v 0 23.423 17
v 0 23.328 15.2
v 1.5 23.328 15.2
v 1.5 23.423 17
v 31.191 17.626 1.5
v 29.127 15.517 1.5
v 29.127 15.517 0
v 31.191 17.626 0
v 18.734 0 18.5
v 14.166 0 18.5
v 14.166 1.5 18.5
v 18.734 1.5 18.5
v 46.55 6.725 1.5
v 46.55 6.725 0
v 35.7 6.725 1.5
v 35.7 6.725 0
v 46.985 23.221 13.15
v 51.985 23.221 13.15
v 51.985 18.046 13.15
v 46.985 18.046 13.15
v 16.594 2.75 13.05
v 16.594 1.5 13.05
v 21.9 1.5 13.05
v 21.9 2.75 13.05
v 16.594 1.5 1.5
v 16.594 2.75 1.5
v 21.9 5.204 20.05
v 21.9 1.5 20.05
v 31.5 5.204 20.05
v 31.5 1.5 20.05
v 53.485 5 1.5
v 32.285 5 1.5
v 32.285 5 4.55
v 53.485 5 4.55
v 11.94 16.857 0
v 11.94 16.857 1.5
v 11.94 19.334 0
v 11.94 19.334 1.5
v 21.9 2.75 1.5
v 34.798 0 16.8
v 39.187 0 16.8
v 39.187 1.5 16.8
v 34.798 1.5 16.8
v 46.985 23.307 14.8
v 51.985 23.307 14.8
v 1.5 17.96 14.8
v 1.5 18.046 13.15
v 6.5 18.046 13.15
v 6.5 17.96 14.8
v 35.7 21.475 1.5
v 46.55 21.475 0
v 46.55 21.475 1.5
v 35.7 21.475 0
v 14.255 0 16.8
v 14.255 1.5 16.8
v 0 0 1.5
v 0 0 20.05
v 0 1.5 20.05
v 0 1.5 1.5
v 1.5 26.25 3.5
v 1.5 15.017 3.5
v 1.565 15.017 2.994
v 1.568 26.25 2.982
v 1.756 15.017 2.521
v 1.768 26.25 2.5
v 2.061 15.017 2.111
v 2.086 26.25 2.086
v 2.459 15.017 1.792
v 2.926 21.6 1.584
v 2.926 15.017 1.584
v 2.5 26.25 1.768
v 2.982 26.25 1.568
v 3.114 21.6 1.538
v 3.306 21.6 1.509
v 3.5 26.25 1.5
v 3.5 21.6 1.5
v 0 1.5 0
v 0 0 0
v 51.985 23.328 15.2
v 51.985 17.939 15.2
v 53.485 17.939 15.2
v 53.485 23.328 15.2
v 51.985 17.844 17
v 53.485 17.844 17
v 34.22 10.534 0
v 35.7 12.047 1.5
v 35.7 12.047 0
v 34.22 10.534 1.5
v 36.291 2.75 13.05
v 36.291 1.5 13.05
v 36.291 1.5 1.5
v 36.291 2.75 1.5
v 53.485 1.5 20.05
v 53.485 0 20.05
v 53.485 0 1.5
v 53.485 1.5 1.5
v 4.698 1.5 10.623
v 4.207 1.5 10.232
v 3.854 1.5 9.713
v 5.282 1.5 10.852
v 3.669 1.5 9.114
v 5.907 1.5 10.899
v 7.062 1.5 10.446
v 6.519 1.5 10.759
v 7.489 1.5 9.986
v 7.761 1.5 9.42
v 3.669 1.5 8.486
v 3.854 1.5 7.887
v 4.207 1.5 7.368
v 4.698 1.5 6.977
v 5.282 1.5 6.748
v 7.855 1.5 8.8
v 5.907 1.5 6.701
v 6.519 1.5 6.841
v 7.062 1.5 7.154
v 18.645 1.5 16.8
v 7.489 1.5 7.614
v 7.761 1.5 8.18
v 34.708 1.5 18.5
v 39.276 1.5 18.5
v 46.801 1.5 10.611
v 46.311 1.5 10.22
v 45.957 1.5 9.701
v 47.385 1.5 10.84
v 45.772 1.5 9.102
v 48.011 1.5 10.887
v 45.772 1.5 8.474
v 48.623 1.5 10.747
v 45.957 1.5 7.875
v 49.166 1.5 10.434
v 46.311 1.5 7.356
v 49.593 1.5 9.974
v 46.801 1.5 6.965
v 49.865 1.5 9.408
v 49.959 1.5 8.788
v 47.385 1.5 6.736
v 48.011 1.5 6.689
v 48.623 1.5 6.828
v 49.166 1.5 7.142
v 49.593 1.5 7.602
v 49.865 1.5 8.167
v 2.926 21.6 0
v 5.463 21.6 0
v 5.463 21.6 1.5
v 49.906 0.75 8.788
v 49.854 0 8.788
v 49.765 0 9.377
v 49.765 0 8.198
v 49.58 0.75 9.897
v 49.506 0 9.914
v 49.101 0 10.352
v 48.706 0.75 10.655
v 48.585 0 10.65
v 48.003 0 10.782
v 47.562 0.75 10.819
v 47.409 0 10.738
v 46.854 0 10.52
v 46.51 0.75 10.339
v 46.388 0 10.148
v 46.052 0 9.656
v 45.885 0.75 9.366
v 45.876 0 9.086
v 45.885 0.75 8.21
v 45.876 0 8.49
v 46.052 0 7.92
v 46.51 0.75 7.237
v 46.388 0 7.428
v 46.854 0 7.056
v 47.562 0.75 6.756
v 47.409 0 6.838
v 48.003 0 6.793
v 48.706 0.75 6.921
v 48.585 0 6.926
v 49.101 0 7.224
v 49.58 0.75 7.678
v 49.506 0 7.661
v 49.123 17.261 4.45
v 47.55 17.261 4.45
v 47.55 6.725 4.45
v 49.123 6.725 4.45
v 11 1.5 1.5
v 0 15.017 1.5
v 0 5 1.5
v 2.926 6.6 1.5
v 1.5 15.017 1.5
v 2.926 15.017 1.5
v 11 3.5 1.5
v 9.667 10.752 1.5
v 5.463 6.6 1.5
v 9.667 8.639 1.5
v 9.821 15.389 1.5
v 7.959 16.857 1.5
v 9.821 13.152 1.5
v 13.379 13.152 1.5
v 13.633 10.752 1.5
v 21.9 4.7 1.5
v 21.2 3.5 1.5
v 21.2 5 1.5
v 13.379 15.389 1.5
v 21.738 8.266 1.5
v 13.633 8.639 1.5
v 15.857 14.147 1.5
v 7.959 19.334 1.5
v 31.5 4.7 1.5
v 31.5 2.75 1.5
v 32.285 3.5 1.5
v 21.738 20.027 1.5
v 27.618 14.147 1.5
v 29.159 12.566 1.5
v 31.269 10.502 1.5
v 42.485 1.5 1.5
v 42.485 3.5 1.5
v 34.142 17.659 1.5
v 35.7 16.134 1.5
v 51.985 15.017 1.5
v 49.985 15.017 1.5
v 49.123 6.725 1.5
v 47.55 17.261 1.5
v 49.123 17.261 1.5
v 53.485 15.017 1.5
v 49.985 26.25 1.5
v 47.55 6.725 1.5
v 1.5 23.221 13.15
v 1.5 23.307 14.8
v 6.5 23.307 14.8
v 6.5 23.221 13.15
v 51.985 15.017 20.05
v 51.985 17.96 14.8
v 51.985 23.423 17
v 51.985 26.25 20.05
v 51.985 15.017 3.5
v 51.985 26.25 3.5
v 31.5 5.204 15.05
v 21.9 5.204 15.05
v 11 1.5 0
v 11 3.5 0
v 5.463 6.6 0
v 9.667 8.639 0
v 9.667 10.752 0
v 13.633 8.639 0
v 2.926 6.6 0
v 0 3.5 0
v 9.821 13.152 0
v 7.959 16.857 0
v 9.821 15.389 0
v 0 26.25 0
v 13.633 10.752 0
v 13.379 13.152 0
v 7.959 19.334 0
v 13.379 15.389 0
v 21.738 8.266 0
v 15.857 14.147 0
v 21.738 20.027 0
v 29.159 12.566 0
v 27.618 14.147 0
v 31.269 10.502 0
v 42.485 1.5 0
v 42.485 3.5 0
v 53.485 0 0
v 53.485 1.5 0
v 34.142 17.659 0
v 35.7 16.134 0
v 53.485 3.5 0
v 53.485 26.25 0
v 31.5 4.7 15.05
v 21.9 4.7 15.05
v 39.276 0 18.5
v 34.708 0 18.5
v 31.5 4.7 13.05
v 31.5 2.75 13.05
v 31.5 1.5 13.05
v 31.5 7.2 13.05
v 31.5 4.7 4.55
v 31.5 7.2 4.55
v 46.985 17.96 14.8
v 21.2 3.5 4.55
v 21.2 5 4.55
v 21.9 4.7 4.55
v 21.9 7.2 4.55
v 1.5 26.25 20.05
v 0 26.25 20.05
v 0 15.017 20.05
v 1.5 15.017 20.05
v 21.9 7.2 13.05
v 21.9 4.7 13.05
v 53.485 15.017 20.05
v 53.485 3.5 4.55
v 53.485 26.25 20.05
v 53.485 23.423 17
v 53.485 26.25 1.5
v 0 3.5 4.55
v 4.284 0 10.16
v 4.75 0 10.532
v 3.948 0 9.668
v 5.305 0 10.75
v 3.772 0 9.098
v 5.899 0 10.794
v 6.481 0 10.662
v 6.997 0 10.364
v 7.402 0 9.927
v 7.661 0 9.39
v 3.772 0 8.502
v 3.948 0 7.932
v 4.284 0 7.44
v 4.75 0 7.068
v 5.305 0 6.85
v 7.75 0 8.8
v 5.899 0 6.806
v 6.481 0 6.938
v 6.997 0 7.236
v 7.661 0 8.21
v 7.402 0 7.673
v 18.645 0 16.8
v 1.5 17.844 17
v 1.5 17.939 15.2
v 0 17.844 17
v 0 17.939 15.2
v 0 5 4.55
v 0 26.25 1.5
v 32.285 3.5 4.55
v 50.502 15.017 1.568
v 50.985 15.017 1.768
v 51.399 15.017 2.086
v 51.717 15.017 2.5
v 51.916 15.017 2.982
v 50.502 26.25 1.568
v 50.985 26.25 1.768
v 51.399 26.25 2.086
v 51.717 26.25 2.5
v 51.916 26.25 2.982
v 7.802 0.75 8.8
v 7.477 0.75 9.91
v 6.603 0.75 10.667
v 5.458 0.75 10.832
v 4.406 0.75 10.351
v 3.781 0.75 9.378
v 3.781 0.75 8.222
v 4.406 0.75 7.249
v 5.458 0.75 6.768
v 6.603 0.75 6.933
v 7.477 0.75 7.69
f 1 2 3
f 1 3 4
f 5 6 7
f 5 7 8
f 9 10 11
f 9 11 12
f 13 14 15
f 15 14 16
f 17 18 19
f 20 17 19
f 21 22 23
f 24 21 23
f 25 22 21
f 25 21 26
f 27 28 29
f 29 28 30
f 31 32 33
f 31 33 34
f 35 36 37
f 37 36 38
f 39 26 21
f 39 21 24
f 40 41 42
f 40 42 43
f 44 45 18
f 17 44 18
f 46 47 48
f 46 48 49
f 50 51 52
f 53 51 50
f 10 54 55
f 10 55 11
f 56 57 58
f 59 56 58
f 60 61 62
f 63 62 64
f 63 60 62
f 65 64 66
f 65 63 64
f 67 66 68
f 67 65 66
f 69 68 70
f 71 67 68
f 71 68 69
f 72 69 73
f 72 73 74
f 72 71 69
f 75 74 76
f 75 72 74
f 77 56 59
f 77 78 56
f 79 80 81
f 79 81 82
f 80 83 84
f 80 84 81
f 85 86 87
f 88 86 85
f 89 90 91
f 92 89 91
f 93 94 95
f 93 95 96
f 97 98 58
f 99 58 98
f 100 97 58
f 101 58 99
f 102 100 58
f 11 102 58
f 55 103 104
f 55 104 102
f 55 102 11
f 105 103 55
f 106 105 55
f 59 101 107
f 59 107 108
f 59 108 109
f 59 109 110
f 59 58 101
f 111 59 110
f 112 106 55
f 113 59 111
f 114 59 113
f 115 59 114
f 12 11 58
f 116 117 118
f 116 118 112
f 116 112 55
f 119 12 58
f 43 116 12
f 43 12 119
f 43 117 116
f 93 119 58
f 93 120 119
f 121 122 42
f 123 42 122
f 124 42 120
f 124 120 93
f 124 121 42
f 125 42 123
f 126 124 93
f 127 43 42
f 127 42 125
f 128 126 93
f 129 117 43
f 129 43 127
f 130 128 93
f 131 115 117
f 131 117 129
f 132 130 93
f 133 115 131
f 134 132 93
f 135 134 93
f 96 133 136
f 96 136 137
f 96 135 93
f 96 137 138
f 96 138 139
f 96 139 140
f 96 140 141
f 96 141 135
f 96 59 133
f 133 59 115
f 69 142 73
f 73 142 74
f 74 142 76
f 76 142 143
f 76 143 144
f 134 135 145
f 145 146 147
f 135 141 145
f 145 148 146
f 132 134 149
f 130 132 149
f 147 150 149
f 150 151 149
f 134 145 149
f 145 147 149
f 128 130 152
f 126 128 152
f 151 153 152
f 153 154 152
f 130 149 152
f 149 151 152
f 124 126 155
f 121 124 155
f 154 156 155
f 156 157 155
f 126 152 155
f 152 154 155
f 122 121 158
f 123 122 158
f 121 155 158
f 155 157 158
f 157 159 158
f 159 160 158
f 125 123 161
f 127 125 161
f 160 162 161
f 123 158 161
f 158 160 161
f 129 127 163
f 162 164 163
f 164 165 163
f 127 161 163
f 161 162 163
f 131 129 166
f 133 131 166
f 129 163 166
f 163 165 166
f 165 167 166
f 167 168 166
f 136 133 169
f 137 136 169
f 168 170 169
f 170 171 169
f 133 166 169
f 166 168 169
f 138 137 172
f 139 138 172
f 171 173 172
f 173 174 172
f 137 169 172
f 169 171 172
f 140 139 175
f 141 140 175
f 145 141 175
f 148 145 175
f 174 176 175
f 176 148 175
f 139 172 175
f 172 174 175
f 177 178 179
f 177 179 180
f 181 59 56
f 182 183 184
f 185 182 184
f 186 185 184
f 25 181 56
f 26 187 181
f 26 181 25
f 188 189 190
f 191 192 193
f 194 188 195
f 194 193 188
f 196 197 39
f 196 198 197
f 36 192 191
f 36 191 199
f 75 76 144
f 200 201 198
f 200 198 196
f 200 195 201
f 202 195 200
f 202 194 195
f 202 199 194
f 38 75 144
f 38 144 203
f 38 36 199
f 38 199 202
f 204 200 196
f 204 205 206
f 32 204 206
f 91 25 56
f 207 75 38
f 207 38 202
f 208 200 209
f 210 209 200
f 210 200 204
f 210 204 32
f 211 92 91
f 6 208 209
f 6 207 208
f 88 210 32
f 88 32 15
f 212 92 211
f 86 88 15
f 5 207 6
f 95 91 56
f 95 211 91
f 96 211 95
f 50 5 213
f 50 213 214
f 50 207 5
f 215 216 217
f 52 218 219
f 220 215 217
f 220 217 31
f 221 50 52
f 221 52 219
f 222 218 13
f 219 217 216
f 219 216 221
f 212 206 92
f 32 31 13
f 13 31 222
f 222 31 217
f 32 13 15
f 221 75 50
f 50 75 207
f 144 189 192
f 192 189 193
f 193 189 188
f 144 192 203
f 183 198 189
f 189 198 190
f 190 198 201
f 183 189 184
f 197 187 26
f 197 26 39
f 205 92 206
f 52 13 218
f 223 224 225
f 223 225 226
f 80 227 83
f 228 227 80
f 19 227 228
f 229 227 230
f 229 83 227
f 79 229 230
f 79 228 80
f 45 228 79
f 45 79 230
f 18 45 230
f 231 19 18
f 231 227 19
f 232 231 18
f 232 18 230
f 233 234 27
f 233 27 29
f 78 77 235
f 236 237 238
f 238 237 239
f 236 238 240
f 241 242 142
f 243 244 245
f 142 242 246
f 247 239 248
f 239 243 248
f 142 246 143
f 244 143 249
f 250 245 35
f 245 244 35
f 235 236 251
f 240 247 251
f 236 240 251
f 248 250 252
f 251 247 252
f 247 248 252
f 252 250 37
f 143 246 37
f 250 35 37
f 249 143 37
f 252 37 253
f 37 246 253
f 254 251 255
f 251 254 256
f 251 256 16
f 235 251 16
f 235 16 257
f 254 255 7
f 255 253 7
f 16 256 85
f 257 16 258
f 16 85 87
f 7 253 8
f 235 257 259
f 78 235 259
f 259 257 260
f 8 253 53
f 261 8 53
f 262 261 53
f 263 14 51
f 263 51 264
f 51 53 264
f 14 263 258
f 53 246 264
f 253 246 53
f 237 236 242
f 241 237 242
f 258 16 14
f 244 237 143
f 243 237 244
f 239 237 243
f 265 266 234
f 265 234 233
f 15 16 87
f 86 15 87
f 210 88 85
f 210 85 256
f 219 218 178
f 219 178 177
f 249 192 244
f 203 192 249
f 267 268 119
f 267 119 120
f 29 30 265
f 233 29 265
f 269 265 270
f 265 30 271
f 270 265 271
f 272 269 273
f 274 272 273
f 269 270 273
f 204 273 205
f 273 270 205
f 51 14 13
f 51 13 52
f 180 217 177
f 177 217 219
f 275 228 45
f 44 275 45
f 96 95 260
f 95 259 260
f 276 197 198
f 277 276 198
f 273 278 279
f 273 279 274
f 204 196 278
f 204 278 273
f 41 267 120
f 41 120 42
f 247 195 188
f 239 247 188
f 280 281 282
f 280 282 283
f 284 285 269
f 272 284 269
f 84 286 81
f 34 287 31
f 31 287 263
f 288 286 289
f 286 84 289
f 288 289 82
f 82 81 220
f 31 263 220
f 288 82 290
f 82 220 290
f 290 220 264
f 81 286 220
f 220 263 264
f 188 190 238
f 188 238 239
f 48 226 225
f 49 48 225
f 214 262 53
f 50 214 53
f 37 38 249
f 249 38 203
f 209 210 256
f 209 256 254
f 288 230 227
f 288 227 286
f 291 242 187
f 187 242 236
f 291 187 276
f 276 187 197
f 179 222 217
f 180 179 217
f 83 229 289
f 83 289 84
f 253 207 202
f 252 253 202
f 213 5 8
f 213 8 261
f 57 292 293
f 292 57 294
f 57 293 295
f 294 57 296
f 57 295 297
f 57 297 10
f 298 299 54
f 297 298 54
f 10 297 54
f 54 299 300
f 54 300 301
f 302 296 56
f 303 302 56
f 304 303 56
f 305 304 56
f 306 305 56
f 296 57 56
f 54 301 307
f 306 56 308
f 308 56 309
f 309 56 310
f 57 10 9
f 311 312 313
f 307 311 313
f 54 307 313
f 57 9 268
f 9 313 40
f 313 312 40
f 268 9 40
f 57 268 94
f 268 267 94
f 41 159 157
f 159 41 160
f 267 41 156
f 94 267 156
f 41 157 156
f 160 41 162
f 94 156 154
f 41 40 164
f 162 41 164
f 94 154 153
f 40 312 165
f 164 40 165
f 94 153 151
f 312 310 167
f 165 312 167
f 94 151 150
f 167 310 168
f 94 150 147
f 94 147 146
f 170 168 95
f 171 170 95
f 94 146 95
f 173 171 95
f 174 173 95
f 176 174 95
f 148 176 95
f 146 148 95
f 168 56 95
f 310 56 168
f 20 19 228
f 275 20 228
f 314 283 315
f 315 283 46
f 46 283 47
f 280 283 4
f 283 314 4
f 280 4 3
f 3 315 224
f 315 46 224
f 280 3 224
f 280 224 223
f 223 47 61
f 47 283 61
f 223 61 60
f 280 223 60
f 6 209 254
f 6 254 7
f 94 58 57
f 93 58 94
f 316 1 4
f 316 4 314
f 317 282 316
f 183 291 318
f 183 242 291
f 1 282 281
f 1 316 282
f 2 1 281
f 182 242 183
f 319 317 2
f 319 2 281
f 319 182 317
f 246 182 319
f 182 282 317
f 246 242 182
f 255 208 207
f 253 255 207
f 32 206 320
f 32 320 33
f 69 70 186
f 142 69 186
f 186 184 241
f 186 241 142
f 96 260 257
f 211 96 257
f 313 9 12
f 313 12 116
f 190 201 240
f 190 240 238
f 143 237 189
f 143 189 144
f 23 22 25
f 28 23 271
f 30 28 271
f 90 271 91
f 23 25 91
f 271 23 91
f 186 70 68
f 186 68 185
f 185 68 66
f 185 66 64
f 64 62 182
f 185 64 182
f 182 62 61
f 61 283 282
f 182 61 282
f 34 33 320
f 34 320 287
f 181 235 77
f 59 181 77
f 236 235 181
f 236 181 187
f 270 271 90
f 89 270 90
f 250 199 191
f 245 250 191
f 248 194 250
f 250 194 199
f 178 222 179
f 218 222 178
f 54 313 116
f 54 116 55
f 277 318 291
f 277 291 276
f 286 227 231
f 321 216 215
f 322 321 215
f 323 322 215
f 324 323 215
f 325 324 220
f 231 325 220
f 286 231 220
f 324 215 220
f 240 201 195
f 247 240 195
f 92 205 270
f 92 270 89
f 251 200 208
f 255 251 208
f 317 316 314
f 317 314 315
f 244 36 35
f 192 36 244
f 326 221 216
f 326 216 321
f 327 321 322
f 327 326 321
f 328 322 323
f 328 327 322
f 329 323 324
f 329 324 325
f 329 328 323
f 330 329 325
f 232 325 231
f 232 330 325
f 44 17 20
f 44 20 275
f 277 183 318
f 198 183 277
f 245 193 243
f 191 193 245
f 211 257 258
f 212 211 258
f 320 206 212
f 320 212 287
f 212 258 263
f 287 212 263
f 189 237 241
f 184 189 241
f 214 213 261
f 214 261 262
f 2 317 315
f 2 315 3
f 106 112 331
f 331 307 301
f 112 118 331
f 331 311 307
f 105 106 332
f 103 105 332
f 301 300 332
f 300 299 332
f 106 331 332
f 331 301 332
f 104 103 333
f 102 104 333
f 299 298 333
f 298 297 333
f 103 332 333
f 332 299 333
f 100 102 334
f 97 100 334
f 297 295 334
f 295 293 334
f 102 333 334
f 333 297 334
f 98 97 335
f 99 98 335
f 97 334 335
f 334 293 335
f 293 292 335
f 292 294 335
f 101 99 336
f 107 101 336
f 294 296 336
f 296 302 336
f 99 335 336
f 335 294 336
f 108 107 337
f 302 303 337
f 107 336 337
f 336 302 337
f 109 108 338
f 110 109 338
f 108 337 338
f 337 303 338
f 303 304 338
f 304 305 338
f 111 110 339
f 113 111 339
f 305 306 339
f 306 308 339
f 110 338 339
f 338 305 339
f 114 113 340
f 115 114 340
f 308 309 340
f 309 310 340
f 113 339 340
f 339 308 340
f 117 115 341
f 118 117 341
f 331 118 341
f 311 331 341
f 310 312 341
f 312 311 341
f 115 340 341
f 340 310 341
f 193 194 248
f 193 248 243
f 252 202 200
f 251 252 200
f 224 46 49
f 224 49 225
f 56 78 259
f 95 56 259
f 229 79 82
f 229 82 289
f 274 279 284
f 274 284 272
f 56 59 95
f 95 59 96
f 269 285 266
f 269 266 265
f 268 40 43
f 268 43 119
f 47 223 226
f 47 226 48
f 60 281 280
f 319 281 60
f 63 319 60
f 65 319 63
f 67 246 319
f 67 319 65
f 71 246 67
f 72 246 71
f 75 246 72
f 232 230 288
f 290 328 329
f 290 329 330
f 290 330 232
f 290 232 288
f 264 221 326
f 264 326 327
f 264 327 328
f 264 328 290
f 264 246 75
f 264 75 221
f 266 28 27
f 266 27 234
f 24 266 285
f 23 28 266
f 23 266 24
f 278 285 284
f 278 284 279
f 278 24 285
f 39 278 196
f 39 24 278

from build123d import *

# Parameters (mm, degrees)
SKETCH1_W                              = 53.48460998
SKETCH1_H                              = 26.25
FRONT_SIDE_MAIN_DEPTH                  = 1.5
RESET_HOLE_DEPTH                       = 3.75
SKETCH15_W                             = 3.966010581
SKETCH15_H                             = 2.112155191
SKETCH15_W_2                           = 3.557190409
SKETCH15_H_2                           = 2.236587576
SKETCH15_W_3                           = 3.981127105
SKETCH15_H_3                           = 2.476855865
COMPONENT_HOLES_DEPTH                  = 3.75
SKETCH16_W                             = 10.85
SKETCH16_H                             = 14.75
MICROPHONE_HOLE_DEPTH                  = 1.5
SKETCH24_W                             = 1.5
SKETCH24_H                             = 11.233042059
RIGHT_SIDE_TOP_DEPTH                   = 18.55
SNAP_GROOVE_RIGHT_DEPTH                = 1.5
SKETCH26_W                             = 1.5
SKETCH26_H                             = 11.233042059
LEFT_SIDE_TOP_DEPTH                    = 18.55
SNAP_START                             = 51.98460998
SNAP_GROOVE_LEFT_DEPTH                 = 1.5
SKETCH20_W                             = 53.48460998
SKETCH20_H                             = 1.5
BOTTOM_BASE_DEPTH                      = 18.55
SERVO_START                            = -1.5
SKETCH18_W                             = 9.6
SKETCH18_H                             = 3.2
SERVO_SEPERATOR_BOTTOM_DEPTH           = 20.05
SKETCH34_W                             = 2.537171882
SKETCH34_H                             = 15
PROGRAMMING_HOLE_DEPTH                 = 3.75
SKETCH38_W                             = 9.6
SKETCH38_H                             = 5
BACK_BATTERY_HOLDER_BOTTOM_DEPTH       = 0.504457941
SKETCH40_R                             = 2
SERVO_ARM_HOLES_BOTTOM_DEPTH           = 1.5
SERVO_ARM_HOLES_BOTTOM_DRAFT           = 4
SERVO_ARM_HOLES_BOTTOM_PROFILE_2_DEPTH = 1.5
SERVO_ARM_HOLES_BOTTOM_PROFILE_2_DRAFT = 4
SKETCH47_W                             = 11
SKETCH47_H                             = 2
SOLAR_ARM_HOLES_FRONT_DEPTH            = 1.5
FILLET1_R                              = 2
SKETCH48_W                             = 9.6
SKETCH48_H                             = 8.5
SERVO_TALLER_SEPERATOR_BOTTOM_DEPTH    = 2.5
SKETCH49_W                             = 1.573389805
SKETCH49_H                             = 10.535992885
SERVO_2_CASE_SPACER_FRONT_DEPTH        = 2.95
SKETCH51_W                             = 4.791370676
SKETCH51_H                             = 11.55
SKETCH51_W_2                           = 5.306259021
SERVO_LIFTERS_BOTTOM_DEPTH             = 1.25
SKETCH52_W                             = 21.2
SKETCH52_H                             = 1.5
SERVO_UNDER_SUPPORT_DEPTH              = 3.05
SERVO_TOP_SUPPORT_RIGHT_DEPTH          = 5
SERVO_TOP_SUPPORT_LEFT_DEPTH           = 5
SNAP_GROOVE_BOTTOM_RIGHT_DEPTH         = 1.5
SNAP_GROOVE_BOTTOM_LEFT_DEPTH          = 1.5


# Read off the part's stored shape, not the designer's step: Snap Groove - Right, Snap Groove - Left, Snap Groove - Bottom Right, Snap Groove - Bottom Left
with BuildPart() as part:
    # Sketch1 → Front Side - Main (new body)
    with BuildSketch(Plane.XY):
        with Locations((26.74230499, 13.125)):
            Rectangle(SKETCH1_W, SKETCH1_H)
    extrude(amount=FRONT_SIDE_MAIN_DEPTH)

    # Reset Hole Sketch → Reset Hole (cut)
    with BuildSketch(Plane(origin=(0, 0, 3.75), x_dir=(-1, 0, 0), z_dir=(0, 0, -1))):
        Polygon((-31.190735744, 17.626168756), (-34.141748042, 17.658585925), (-36.251351249, 15.594827519), (-36.283768419, 12.643815222), (-34.220010013, 10.534212015), (-31.268997715, 10.501794845), (-29.159394508, 12.565553251), (-29.126977338, 15.516565548), align=None)
    extrude(amount=RESET_HOLE_DEPTH, mode=Mode.SUBTRACT)

    # Sketch15 → Component Holes (cut)
    with BuildSketch(Plane(origin=(0, 0, 3.75), x_dir=(-1, 0, 0), z_dir=(0, 0, -1))):
        Polygon((-21.737702993, 20.027277789), (-15.857179586, 14.146754382), (-21.737702993, 8.266230975), (-27.6182264, 14.146754382), align=None)
        with Locations((-11.649935563, 9.695513201)):
            Rectangle(SKETCH15_W, SKETCH15_H)
        with Locations((-11.599935563, 14.270513201)):
            Rectangle(SKETCH15_W_2, SKETCH15_H_2)
        with Locations((-9.949935563, 18.095513201)):
            Rectangle(SKETCH15_W_3, SKETCH15_H_3)
    extrude(amount=COMPONENT_HOLES_DEPTH, mode=Mode.SUBTRACT)

    # Sketch16 → Microphone Hole (cut)
    with BuildSketch(Plane(origin=(0, 0, 0), x_dir=(-1, 0, 0), z_dir=(0, 0, -1))):
        with Locations((-41.124935562, 14.1)):
            Rectangle(SKETCH16_W, SKETCH16_H)
    extrude(amount=-MICROPHONE_HOLE_DEPTH, mode=Mode.SUBTRACT)

    # Sketch24 → Right Side - Top (add)
    with BuildSketch(Plane.XY.offset(1.5)):
        with Locations((0.75, 20.633478971)):
            Rectangle(SKETCH24_W, SKETCH24_H)
    extrude(amount=RIGHT_SIDE_TOP_DEPTH)

    # Snap Groove - Right outline → Snap Groove - Right (cut)
    with BuildSketch(Plane.YZ):
        Polygon((17.938719749, 15.2), (23.328238193, 15.2), (23.422572195, 17), (17.844385746, 17), align=None)
    extrude(amount=SNAP_GROOVE_RIGHT_DEPTH, mode=Mode.SUBTRACT)

    # Sketch26 → Left Side - Top (add)
    with BuildSketch(Plane.XY.offset(1.5)):
        with Locations((52.73460998, 20.633478971)):
            Rectangle(SKETCH26_W, SKETCH26_H)
    extrude(amount=LEFT_SIDE_TOP_DEPTH)

    # Snap Groove - Left outline → Snap Groove - Left (cut)
    with BuildSketch(Plane.YZ.offset(SNAP_START)):
        Polygon((17.938719748, 15.2), (23.328238192, 15.2), (23.422572195, 17), (17.844385746, 17), align=None)
    extrude(amount=SNAP_GROOVE_LEFT_DEPTH, mode=Mode.SUBTRACT)

    # Sketch18 → Servo Seperator - Bottom (add)
    with BuildSketch(Plane.XY.offset(1.5).offset(SERVO_START)):
        with Locations((26.7, 3.1)):
            Rectangle(SKETCH18_W, SKETCH18_H)
    extrude(amount=SERVO_SEPERATOR_BOTTOM_DEPTH)

    # Sketch34 → Programming Hole (cut)
    with BuildSketch(Plane(origin=(0, 0, 0), x_dir=(-1, 0, 0), z_dir=(0, 0, -1))):
        with Locations((-4.194161079, 14.100049249)):
            Rectangle(SKETCH34_W, SKETCH34_H)
    extrude(amount=-PROGRAMMING_HOLE_DEPTH, mode=Mode.SUBTRACT)

    # Sketch38 → Back Battery Holder - Bottom (add)
    with BuildSketch(Plane(origin=(0, 4.7, 0), x_dir=(1, 0, 0), z_dir=(0, 1, 0))):
        with Locations((26.7, -17.55)):
            Rectangle(SKETCH38_W, SKETCH38_H)
    extrude(amount=BACK_BATTERY_HOLDER_BOTTOM_DEPTH)

    # Sketch47 → Solar Arm Holes - Front (cut)
    with BuildSketch(Plane(origin=(0, 0, 0), x_dir=(-1, 0, 0), z_dir=(0, 0, -1))):
        with Locations((-47.98460998, 2.5)):
            Rectangle(SKETCH47_W, SKETCH47_H)
        with Locations((-5.5, 2.5)):
            Rectangle(SKETCH47_W, SKETCH47_H)
    extrude(amount=-SOLAR_ARM_HOLES_FRONT_DEPTH, mode=Mode.SUBTRACT)

    # Fillet1
    # the kernel refuses this fillet: 2 mm, written as the material it adds along each edge
    with BuildSketch(Plane(origin=(1.5, 26.25, 1.5), x_dir=(1, 0, 0), z_dir=(0, -1, 0))) as fillet1_piece_1_section:
        with BuildLine():
            CenterArc((FILLET1_R, FILLET1_R), FILLET1_R, 180, 90)
            Line((0, FILLET1_R), (0, 0))
            Line((0, 0), (FILLET1_R, 0))
        make_face()
    fillet1_piece_1 = extrude(amount=11.233042059, mode=Mode.PRIVATE)
    fillet1_piece_1 = split(fillet1_piece_1, bisect_by=Plane(origin=(3.153594052, 21.600049249, 1.498546269), z_dir=(0, 1, 0)), keep=Keep.TOP, mode=Mode.PRIVATE)
    fillet1_piece_1 = split(fillet1_piece_1, bisect_by=Plane(origin=(2.925575138, 23.925024625, 1.498546269), z_dir=(1, 0, 0)), keep=Keep.TOP, mode=Mode.PRIVATE)
    add(fillet1_piece_1)
    with BuildSketch(Plane(origin=(1.5, 26.25, 1.5), x_dir=(1, 0, 0), z_dir=(0, -1, 0))) as fillet1_piece_2_section:
        with BuildLine():
            CenterArc((FILLET1_R, FILLET1_R), FILLET1_R, 180, 90)
            Line((0, FILLET1_R), (0, 0))
            Line((0, 0), (FILLET1_R, 0))
        make_face()
    fillet1_piece_2 = extrude(amount=11.233042059, mode=Mode.PRIVATE)
    fillet1_piece_2 = split(fillet1_piece_2, bisect_by=Plane(origin=(1.90508607, 21.600049249, 1.970835912), z_dir=(0, 1, 0)), keep=Keep.TOP, mode=Mode.PRIVATE)
    fillet1_piece_2 = split(fillet1_piece_2, bisect_by=Plane(origin=(2.925575138, 23.925024625, 1.970835912), z_dir=(-1, 0, 0)), keep=Keep.TOP, mode=Mode.PRIVATE)
    add(fillet1_piece_2)
    with BuildSketch(Plane(origin=(1.5, 26.25, 1.5), x_dir=(1, 0, 0), z_dir=(0, -1, 0))) as fillet1_piece_3_section:
        with BuildLine():
            CenterArc((FILLET1_R, FILLET1_R), FILLET1_R, 180, 90)
            Line((0, FILLET1_R), (0, 0))
            Line((0, 0), (FILLET1_R, 0))
        make_face()
    fillet1_piece_3 = extrude(amount=11.233042059, mode=Mode.PRIVATE)
    fillet1_piece_3 = split(fillet1_piece_3, bisect_by=Plane(origin=(1.90508607, 21.600049249, 1.970835912), z_dir=(0, -1, 0)), keep=Keep.TOP, mode=Mode.PRIVATE)
    fillet1_piece_3 = split(fillet1_piece_3, bisect_by=Plane(origin=(2.925575138, 18.308503595, 1.970835912), z_dir=(-1, 0, 0)), keep=Keep.TOP, mode=Mode.PRIVATE)
    add(fillet1_piece_3)
    with BuildSketch(Plane(origin=(51.98460998, 26.25, 1.5), x_dir=(-1, 0, 0), z_dir=(0, -1, 0))) as fillet1_piece_4:
        with BuildLine():
            CenterArc((FILLET1_R, -FILLET1_R), FILLET1_R, 90, 90)
            Line((0, -FILLET1_R), (0, 0))
            Line((0, 0), (FILLET1_R, 0))
        make_face()
    extrude(amount=11.233042059)

    # Sketch48 → Servo Taller Seperator - Bottom (add)
    with BuildSketch(Plane(origin=(0, 4.7, 0), x_dir=(1, 0, 0), z_dir=(0, 1, 0))):
        with Locations((26.7, -8.8)):
            Rectangle(SKETCH48_W, SKETCH48_H)
    extrude(amount=SERVO_TALLER_SEPERATOR_BOTTOM_DEPTH)

    # Sketch49 → Servo 2 Case Spacer - Front (add)
    with BuildSketch(Plane.XY.offset(1.5)):
        with Locations((48.336630465, 11.992996443)):
            Rectangle(SKETCH49_W, SKETCH49_H)
    extrude(amount=SERVO_2_CASE_SPACER_FRONT_DEPTH)

    # Sketch51 → Servo Lifters - Bottom (add)
    with BuildSketch(Plane(origin=(0, 1.5, 0), x_dir=(1, 0, 0), z_dir=(0, 1, 0))):
        with Locations((33.895685338, -7.275)):
            Rectangle(SKETCH51_W, SKETCH51_H)
        with Locations((19.24687049, -7.275)):
            Rectangle(SKETCH51_W_2, SKETCH51_H)
    extrude(amount=SERVO_LIFTERS_BOTTOM_DEPTH)

    # Sketch52 → Servo Under Support (add)
    with BuildSketch(Plane.XY.offset(1.5)):
        with Locations((10.6, 4.25)):
            Rectangle(SKETCH52_W, SKETCH52_H)
        with Locations((42.88460998, 4.25)):
            Rectangle(SKETCH52_W, SKETCH52_H)
    extrude(amount=SERVO_UNDER_SUPPORT_DEPTH)

    # Sketch53 → Servo Top Support - Right (add)
    with BuildSketch(Plane(origin=(1.5, 0, 0), x_dir=(0, 0, -1), z_dir=(1, 0, 0))):
        Polygon((-14.8, 23.307275081), (-13.15, 23.220802245), (-13.15, 18.046155696), (-14.8, 17.95968286), align=None)
    extrude(amount=SERVO_TOP_SUPPORT_RIGHT_DEPTH)

    # Sketch55 → Servo Top Support - Left (add)
    with BuildSketch(Plane.ZY.offset(-51.98460998)):
        Polygon((14.8, 17.95968286), (14.8, 23.307275081), (13.15, 23.220802245), (13.15, 18.046155696), align=None)
    extrude(amount=SERVO_TOP_SUPPORT_LEFT_DEPTH)


with BuildPart() as body_2:
    # Sketch20 → Bottom Base (new body)
    with BuildSketch(Plane.XY.offset(1.5)):
        with Locations((26.74230499, 0.75)):
            Rectangle(SKETCH20_W, SKETCH20_H)
    extrude(amount=BOTTOM_BASE_DEPTH)


with BuildPart() as servo_arm_holes_bottom_tool:
    # Sketch40 → Servo arm Holes - Bottom (with draft: the straight prism first)
    with BuildSketch(Plane.XZ):
        with Locations((47.853853261, 8.787851544)):
            Circle(SKETCH40_R)
    extrude(amount=-SERVO_ARM_HOLES_BOTTOM_DEPTH)
    # Servo arm Holes - Bottom: the draft: its side faces are tilted about the plane it starts from
    servo_arm_holes_bottom_sides = [servo_arm_holes_bottom_tool.faces().sort_by_distance(p)[0] for p in [
        (45.853853261, 0.75, 8.787851544),
    ]]
    draft(servo_arm_holes_bottom_sides, Plane.XZ, SERVO_ARM_HOLES_BOTTOM_DRAFT)


with BuildPart() as body_2_1:
    add(body_2.part)

    # Servo arm Holes - Bottom: cut by servo_arm_holes_bottom_tool
    add(servo_arm_holes_bottom_tool.part, mode=Mode.SUBTRACT)


with BuildPart() as servo_arm_holes_bottom_profile_2_tool:
    # Sketch40 → Servo arm Holes - Bottom profile 2 (with draft: the straight prism first)
    with BuildSketch(Plane.XZ):
        with Locations((5.75, 8.8)):
            Circle(SKETCH40_R)
    extrude(amount=-SERVO_ARM_HOLES_BOTTOM_PROFILE_2_DEPTH)
    # Servo arm Holes - Bottom profile 2: the draft: its side faces are tilted about the plane it starts from
    servo_arm_holes_bottom_profile_2_sides = [servo_arm_holes_bottom_profile_2_tool.faces().sort_by_distance(p)[0] for p in [
        (3.75, 0.75, 8.8),
    ]]
    draft(servo_arm_holes_bottom_profile_2_sides, Plane.XZ, SERVO_ARM_HOLES_BOTTOM_PROFILE_2_DRAFT)


with BuildPart() as body_2_2:
    add(body_2_1.part)

    # Servo arm Holes - Bottom profile 2: cut by servo_arm_holes_bottom_profile_2_tool
    add(servo_arm_holes_bottom_profile_2_tool.part, mode=Mode.SUBTRACT)

    # Snap Groove - Bottom Right outline → Snap Groove - Bottom Right (cut)
    with BuildSketch(Plane(origin=(0, 0, 0), x_dir=(1, 0, 0), z_dir=(0, 1, 0))):
        Polygon((14.166147553, -18.5), (18.733852447, -18.5), (18.644759222, -16.8), (14.255240778, -16.8), align=None)
    extrude(amount=SNAP_GROOVE_BOTTOM_RIGHT_DEPTH, mode=Mode.SUBTRACT)

    # Snap Groove - Bottom Left outline → Snap Groove - Bottom Left (cut)
    with BuildSketch(Plane(origin=(0, 0, 0), x_dir=(1, 0, 0), z_dir=(0, 1, 0))):
        Polygon((39.276157437, -18.5), (39.187064212, -16.8), (34.797545768, -16.8), (34.708452543, -18.5), align=None)
    extrude(amount=SNAP_GROOVE_BOTTOM_LEFT_DEPTH, mode=Mode.SUBTRACT)


solid = Compound([part.part, body_2_2.part])
